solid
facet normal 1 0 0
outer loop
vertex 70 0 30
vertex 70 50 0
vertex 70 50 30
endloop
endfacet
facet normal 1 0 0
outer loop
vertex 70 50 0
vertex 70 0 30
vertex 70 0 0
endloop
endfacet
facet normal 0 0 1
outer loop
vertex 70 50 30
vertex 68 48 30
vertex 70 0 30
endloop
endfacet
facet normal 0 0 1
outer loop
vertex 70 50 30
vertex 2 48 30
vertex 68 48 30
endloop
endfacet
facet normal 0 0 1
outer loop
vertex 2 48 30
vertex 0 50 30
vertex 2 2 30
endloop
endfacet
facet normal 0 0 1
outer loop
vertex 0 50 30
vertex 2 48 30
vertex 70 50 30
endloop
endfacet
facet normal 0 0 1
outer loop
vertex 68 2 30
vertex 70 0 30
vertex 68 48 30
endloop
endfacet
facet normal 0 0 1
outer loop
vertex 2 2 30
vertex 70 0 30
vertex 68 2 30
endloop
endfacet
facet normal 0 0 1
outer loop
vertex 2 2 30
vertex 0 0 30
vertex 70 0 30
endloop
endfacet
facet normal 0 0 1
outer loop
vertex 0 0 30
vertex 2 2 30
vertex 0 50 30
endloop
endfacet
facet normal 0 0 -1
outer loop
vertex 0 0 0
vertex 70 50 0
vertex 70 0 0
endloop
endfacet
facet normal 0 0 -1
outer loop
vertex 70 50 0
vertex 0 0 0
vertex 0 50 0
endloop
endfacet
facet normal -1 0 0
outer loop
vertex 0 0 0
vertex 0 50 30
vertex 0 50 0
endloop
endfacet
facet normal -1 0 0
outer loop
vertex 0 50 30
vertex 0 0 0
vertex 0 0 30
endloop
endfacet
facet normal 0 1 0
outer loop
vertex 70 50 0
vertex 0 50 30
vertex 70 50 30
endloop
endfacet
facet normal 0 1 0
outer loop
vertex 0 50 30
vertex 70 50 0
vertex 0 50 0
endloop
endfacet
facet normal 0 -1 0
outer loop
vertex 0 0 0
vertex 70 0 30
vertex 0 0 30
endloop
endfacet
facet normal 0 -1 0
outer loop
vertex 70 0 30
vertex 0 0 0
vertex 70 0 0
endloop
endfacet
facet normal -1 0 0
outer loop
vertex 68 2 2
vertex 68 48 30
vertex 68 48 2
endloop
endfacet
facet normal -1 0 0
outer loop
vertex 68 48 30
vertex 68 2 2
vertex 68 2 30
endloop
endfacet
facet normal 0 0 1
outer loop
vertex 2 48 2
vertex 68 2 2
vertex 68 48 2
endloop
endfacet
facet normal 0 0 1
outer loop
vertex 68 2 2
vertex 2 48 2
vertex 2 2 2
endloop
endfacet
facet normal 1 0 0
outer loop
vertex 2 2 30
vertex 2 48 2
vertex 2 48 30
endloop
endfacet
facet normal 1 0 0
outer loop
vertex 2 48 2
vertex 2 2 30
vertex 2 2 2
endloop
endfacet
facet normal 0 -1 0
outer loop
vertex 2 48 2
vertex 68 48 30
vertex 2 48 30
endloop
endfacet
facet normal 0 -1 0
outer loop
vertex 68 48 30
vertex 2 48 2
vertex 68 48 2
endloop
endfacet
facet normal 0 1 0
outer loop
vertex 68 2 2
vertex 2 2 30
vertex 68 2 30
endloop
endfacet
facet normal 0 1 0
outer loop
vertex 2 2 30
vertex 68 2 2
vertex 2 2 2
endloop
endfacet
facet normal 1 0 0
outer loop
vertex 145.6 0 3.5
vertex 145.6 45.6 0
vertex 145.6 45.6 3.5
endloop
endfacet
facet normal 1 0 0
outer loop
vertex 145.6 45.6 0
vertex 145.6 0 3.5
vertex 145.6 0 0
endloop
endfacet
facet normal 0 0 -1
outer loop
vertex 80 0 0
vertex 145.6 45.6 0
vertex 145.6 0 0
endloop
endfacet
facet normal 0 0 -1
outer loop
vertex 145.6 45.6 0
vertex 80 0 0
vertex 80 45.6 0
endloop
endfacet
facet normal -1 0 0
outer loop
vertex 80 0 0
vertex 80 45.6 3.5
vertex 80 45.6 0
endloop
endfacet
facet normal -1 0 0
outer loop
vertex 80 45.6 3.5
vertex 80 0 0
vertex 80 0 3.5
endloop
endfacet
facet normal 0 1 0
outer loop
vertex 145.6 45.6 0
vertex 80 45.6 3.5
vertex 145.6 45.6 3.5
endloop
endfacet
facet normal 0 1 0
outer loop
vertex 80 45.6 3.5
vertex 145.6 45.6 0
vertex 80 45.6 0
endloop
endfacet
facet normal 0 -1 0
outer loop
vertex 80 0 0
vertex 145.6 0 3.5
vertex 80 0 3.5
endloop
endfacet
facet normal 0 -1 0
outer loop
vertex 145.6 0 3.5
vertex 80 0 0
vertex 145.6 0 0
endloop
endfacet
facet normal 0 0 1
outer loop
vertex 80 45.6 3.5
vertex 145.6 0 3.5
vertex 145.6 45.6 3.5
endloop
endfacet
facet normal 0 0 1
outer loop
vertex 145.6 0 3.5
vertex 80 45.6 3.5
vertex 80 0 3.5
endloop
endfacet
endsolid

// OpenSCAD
// Two-part enclosure for small electronics board
// Print orientation: box on bed (z = 0), lid on +X side, both build upward

// ---------- Parameters ----------
box_x      = 70;    // box outer length (X)
box_y      = 50;    // box outer width (Y)
box_z      = 30;    // box outer height (Z)
box_wall   = 2;     // box wall thickness
box_floor  = 2;     // box floor thickness

gap        = 10;    // gap between box and lid

lip_x      = 65.6;  // lip outer length (X)
lip_y      = 45.6;  // lip outer width (Y)
lip_wall   = 1.5;   // lip wall thickness
lip_h      = 4;     // lip height

eps        = 0.5;   // cutter overshoot

$fn = 64;

// ---------- Derived ----------
box_inner_x = box_x - 2 * box_wall;
box_inner_y = box_y - 2 * box_wall;
box_inner_z = box_z - box_floor;   // open-top cavity height

// ---------- Model ----------
union() {
    // Box
    difference() {
        cube([box_x, box_y, box_z]);
        translate([box_wall, box_wall, box_floor])
            cube([box_inner_x, box_inner_y, box_inner_z + 0.01]); // closed top for clean boolean
    }

    // Lid (printed upside down: plate on bed, lip on top)
    translate([box_x + gap, 0, 0]) {
        union() {
            // Plate
                cube([lip_x, lip_y, 2]);
            // Lip
                translate([0, 0, 2])
                    cube([lip_x, lip_y, lip_wall]);
        }
    }
}
